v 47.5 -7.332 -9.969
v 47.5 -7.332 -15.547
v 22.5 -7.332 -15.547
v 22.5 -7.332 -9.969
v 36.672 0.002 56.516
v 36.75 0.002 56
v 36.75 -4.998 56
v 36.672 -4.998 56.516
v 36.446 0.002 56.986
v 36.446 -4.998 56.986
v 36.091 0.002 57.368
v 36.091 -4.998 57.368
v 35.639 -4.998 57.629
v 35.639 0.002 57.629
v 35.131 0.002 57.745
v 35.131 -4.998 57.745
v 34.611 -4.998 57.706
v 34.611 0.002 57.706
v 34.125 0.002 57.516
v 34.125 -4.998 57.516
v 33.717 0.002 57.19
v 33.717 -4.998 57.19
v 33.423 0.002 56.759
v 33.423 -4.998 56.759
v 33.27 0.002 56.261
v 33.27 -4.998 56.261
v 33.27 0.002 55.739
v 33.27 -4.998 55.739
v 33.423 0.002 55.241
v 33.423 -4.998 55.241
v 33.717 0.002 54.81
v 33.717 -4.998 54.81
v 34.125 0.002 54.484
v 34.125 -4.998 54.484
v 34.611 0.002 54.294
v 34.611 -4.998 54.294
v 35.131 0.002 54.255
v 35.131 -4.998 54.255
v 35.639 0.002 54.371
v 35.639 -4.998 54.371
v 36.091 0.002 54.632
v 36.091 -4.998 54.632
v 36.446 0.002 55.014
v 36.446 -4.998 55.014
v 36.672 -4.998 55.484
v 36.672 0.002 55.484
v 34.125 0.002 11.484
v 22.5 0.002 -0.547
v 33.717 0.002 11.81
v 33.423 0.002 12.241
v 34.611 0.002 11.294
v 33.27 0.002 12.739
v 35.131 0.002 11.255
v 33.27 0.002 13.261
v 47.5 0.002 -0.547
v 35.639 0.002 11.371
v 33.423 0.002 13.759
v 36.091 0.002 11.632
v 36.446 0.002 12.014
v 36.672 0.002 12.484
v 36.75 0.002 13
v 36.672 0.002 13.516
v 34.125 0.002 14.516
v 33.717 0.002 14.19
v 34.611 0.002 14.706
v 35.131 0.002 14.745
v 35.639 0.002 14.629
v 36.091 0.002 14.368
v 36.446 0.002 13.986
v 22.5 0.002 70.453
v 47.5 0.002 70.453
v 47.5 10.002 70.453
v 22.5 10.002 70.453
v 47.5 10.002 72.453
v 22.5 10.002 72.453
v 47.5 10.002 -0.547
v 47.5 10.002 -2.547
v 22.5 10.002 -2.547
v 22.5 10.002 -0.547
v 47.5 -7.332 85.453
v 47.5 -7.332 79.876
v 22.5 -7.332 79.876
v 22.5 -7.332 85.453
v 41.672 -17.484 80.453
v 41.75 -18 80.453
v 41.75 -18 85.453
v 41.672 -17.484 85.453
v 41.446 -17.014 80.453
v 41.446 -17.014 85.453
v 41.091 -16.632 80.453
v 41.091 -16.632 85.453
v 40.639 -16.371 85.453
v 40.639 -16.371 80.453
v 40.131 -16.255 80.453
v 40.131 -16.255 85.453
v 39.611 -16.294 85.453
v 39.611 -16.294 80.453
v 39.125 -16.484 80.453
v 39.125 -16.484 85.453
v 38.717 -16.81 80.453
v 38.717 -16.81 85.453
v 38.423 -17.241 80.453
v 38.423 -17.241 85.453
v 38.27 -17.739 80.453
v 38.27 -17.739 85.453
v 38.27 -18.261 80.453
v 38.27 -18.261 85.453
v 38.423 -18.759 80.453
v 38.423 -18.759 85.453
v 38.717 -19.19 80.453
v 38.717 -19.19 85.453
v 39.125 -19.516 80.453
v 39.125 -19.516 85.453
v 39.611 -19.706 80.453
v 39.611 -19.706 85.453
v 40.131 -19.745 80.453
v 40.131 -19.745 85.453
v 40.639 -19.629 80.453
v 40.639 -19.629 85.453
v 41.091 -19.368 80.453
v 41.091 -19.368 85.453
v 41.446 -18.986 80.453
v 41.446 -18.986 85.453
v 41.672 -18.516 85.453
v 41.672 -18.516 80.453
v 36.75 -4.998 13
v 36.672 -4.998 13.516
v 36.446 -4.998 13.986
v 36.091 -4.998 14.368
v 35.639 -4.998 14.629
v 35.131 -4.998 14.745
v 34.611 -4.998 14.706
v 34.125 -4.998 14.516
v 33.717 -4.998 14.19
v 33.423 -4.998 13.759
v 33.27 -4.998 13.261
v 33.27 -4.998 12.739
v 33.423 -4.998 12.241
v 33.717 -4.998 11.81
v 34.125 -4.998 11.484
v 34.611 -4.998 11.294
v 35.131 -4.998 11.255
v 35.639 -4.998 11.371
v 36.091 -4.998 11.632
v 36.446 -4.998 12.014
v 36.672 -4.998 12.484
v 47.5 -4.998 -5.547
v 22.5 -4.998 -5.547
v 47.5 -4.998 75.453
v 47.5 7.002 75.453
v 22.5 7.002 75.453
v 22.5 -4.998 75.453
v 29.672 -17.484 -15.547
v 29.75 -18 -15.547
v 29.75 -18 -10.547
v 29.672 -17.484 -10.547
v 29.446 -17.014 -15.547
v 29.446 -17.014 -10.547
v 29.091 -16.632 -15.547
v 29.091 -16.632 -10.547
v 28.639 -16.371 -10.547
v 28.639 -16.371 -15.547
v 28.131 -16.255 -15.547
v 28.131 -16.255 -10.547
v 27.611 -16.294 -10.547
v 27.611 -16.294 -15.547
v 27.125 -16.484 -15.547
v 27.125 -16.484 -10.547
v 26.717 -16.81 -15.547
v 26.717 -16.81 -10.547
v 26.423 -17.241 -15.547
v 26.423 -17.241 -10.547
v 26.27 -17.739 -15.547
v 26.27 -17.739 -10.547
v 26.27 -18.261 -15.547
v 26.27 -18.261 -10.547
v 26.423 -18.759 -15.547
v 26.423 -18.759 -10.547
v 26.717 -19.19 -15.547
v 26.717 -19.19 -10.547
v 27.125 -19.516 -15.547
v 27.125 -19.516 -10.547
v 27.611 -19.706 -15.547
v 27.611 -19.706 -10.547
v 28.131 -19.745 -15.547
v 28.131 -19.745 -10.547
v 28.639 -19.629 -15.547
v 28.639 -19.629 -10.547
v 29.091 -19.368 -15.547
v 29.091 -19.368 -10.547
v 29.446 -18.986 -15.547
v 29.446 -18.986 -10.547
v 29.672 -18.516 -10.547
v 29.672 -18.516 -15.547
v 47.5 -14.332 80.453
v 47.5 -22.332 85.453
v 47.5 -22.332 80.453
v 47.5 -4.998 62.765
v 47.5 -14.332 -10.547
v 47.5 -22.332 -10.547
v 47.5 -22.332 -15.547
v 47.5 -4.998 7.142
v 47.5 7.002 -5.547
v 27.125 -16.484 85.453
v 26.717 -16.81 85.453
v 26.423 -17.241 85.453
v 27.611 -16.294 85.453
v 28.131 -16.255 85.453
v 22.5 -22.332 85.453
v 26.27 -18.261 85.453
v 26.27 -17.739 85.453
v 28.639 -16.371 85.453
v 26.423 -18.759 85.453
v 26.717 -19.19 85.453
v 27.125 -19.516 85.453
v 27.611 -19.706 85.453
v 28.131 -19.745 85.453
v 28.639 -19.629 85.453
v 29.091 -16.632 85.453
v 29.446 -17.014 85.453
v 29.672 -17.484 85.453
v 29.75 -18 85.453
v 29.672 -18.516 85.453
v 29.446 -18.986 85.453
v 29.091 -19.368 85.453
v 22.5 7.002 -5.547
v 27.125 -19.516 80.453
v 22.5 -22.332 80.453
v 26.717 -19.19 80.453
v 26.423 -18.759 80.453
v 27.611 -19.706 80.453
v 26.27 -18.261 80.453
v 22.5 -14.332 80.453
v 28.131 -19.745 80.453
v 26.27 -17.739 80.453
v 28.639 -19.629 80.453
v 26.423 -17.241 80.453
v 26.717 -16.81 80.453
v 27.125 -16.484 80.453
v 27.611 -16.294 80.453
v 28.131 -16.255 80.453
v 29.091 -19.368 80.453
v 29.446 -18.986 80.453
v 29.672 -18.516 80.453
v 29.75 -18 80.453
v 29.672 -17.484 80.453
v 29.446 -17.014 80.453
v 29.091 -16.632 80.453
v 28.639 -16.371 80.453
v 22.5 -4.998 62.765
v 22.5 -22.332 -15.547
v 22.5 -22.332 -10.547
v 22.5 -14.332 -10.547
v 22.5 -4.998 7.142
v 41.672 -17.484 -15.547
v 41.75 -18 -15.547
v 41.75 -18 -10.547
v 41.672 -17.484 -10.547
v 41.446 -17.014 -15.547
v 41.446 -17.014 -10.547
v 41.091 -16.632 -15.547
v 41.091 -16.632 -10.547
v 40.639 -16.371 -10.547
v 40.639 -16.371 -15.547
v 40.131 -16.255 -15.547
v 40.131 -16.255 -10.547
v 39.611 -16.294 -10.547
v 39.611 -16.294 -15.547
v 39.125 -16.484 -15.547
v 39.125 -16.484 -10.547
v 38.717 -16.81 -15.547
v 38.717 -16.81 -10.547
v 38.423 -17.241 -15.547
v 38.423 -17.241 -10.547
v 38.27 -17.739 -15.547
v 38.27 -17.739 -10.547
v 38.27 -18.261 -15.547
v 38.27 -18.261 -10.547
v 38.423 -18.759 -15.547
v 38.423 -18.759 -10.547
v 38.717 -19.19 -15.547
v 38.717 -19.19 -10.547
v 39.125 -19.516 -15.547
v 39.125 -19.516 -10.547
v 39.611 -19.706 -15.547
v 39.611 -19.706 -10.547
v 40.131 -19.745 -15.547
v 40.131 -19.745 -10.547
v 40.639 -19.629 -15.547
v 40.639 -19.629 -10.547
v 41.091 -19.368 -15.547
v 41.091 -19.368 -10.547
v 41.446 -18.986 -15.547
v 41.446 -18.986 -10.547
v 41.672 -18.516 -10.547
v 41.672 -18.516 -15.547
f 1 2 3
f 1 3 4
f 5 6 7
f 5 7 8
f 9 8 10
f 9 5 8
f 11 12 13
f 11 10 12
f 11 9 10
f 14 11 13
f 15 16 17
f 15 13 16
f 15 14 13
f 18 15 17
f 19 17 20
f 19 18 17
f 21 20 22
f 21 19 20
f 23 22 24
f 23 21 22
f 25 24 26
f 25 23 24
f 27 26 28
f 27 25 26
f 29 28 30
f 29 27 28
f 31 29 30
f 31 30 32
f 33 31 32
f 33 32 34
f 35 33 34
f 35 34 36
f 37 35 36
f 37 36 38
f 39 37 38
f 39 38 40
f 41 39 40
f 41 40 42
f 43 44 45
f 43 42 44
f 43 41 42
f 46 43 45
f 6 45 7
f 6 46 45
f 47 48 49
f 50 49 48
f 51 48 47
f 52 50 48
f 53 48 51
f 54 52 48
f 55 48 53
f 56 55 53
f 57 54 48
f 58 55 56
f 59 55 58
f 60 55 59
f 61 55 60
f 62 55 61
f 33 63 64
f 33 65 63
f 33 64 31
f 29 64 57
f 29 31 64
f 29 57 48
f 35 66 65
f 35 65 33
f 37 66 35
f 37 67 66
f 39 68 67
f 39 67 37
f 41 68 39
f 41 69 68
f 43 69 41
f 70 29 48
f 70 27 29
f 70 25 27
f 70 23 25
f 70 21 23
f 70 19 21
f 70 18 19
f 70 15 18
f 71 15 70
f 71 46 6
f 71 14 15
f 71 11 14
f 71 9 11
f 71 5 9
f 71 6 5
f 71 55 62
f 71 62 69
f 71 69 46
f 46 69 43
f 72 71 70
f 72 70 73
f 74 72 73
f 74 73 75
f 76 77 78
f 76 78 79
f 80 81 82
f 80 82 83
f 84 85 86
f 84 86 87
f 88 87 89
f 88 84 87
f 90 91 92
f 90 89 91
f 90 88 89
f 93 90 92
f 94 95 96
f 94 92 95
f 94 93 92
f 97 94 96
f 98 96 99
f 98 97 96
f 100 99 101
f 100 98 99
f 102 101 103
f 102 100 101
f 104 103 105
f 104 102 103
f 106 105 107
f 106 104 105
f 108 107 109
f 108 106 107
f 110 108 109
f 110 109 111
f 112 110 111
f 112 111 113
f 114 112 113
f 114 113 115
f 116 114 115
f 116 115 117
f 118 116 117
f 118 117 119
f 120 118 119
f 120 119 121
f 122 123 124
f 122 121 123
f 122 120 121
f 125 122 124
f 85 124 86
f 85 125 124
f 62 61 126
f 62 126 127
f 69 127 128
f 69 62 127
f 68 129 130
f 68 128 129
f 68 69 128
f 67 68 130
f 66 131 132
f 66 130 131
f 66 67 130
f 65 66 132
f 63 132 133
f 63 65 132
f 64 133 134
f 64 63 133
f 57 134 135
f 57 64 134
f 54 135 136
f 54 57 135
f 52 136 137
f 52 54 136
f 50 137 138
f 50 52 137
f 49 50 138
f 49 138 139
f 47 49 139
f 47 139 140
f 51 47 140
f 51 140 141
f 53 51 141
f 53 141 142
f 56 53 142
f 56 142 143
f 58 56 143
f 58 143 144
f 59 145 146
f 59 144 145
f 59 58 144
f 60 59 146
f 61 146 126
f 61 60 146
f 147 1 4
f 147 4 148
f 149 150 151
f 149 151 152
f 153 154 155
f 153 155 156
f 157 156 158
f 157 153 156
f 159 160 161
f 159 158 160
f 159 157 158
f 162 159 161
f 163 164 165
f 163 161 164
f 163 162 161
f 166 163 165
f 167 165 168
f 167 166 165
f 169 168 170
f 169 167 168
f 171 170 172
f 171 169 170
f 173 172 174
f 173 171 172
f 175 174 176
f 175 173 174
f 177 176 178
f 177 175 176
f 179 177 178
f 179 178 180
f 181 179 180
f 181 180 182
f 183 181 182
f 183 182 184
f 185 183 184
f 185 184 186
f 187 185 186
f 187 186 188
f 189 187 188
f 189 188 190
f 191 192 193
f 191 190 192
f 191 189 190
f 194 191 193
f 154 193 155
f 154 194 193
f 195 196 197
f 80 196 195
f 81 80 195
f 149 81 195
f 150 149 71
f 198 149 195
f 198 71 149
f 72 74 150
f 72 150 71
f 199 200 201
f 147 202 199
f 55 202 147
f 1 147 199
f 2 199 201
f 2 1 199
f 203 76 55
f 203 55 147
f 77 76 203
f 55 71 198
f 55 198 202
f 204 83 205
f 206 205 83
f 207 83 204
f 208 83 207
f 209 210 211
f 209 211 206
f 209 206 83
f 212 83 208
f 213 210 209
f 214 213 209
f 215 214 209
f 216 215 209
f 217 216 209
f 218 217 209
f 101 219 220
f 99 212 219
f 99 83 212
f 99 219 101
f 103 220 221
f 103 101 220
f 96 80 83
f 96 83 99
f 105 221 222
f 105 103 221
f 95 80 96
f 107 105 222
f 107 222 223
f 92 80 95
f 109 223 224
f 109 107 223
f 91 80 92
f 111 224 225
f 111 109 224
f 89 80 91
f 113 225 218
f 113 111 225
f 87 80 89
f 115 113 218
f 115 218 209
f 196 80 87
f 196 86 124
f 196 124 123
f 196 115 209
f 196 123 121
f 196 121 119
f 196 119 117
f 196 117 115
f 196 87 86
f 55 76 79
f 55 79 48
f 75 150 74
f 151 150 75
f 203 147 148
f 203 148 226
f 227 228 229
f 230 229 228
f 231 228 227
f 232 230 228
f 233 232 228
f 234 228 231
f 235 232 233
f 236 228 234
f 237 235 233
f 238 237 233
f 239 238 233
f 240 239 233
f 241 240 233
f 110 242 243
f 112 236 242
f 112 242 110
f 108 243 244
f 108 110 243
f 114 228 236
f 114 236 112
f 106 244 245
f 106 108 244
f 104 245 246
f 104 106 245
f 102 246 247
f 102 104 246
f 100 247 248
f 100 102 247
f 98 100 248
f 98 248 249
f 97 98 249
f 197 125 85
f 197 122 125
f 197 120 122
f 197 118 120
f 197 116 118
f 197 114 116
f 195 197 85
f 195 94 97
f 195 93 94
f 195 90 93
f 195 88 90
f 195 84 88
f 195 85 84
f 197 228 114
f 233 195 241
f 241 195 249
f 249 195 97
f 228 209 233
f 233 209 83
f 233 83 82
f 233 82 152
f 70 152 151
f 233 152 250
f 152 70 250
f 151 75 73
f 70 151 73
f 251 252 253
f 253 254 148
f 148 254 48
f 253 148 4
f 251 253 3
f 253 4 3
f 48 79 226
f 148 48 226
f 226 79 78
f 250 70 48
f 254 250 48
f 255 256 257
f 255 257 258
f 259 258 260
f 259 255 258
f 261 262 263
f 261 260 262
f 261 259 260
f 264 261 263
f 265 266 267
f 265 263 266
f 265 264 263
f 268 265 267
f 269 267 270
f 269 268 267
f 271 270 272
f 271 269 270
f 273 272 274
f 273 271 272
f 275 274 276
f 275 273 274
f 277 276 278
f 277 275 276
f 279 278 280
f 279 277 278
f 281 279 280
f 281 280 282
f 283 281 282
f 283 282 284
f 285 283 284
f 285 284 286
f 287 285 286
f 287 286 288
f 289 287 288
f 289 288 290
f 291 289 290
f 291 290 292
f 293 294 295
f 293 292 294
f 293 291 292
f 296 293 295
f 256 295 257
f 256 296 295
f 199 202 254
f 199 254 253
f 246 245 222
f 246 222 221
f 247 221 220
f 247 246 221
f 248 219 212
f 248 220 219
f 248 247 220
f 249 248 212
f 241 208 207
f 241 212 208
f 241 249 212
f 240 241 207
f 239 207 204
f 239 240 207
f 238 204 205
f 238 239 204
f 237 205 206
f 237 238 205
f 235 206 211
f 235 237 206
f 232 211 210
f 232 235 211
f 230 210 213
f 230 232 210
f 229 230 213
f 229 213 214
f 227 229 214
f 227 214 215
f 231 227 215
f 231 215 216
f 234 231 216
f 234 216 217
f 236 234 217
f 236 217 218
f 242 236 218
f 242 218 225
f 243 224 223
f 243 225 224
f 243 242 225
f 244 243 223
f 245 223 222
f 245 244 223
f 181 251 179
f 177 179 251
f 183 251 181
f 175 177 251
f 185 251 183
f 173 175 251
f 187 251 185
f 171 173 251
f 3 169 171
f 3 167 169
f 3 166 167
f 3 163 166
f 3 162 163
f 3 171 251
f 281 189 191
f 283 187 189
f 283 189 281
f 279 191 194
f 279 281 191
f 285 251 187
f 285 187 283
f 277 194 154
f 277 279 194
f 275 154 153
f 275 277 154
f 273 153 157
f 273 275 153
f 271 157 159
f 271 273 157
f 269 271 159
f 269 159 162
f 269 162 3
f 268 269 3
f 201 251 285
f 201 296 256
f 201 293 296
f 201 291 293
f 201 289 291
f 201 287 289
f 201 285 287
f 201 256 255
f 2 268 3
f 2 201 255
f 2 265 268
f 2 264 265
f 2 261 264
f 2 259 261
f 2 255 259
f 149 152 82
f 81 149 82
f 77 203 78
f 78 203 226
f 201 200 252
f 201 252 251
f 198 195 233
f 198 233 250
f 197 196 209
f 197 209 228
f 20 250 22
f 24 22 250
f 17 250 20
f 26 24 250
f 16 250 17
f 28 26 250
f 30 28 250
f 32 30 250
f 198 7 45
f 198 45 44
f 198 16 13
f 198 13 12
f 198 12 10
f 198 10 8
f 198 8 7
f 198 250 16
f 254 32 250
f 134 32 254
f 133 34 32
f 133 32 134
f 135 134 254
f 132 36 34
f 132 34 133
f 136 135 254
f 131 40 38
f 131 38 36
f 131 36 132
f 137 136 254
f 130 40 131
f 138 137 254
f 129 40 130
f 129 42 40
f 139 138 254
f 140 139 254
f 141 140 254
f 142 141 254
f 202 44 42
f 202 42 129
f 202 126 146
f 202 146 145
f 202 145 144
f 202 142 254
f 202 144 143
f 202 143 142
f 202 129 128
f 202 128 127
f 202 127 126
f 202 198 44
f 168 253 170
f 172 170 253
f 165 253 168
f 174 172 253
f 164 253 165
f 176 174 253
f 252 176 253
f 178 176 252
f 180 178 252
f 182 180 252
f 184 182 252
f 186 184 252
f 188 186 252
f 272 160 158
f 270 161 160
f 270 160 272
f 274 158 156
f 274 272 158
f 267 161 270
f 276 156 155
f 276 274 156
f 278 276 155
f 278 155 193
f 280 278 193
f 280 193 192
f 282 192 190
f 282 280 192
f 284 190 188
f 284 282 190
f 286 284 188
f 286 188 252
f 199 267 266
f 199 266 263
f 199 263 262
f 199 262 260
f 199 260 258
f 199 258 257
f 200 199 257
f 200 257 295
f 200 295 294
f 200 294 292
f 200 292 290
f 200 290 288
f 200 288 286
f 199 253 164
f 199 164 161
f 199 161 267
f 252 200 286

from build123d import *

# Parameters (mm, degrees)
CYLINDER024_R          = 1.75
CYLINDER024_DEPTH      = 20
CYLINDER023_R          = 1.75
CYLINDER023_DEPTH      = 20
CYLINDER022_R          = 1.75
CYLINDER022_DEPTH      = 20
CYLINDER021_R          = 1.75
CYLINDER021_DEPTH      = 20
CYLINDER018_R          = 1.75
CYLINDER018_DEPTH      = 20
CYLINDER018_ROLL_ANGLE = 90
CYLINDER017_R          = 1.75
CYLINDER017_DEPTH      = 20
CYLINDER017_ROLL_ANGLE = 90
PAD006_DEPTH           = 25
CHAMFER006_SIZE        = 3


with BuildPart() as cylinder059:
    # Cylinder024 → Cylinder024 (new body)
    with BuildSketch(Plane(origin=(40, -18, -24), x_dir=(1, 0, 0), z_dir=(0, 0, 1))):
        Circle(CYLINDER024_R)
    extrude(amount=CYLINDER024_DEPTH)


with BuildPart() as cylinder058:
    # Cylinder023 → Cylinder023 (new body)
    with BuildSketch(Plane(origin=(28, -18, -24), x_dir=(1, 0, 0), z_dir=(0, 0, 1))):
        Circle(CYLINDER023_R)
    extrude(amount=CYLINDER023_DEPTH)


with BuildPart() as cylinder057:
    # Cylinder022 → Cylinder022 (new body)
    with BuildSketch(Plane(origin=(40, -18, 77), x_dir=(1, 0, 0), z_dir=(0, 0, 1))):
        Circle(CYLINDER022_R)
    extrude(amount=CYLINDER022_DEPTH)


with BuildPart() as cylinder056:
    # Cylinder021 → Cylinder021 (new body)
    with BuildSketch(Plane(origin=(28, -18, 77), x_dir=(1, 0, 0), z_dir=(0, 0, 1))):
        Circle(CYLINDER021_R)
    extrude(amount=CYLINDER021_DEPTH)


with BuildPart() as cylinder053:
    # Cylinder018 → Cylinder018 (new body)
    with BuildSketch(Plane.XY):
        Circle(CYLINDER018_R)
    extrude(amount=CYLINDER018_DEPTH)


with BuildPart() as cylinder053_1:
    # Cylinder018 roll: moved
    add(cylinder053.part.rotate(Axis((0, 0, 0), (1, 0, 0)), CYLINDER018_ROLL_ANGLE))


with BuildPart() as cylinder053_2:
    # Cylinder018 placement: moved
    add(cylinder053_1.part.moved(Location((35, 10, 13))))


with BuildPart() as cylinder052:
    # Cylinder017 → Cylinder017 (new body)
    with BuildSketch(Plane.XY):
        Circle(CYLINDER017_R)
    extrude(amount=CYLINDER017_DEPTH)


with BuildPart() as cylinder052_1:
    # Cylinder017 roll: moved
    add(cylinder052.part.rotate(Axis((0, 0, 0), (1, 0, 0)), CYLINDER017_ROLL_ANGLE))


with BuildPart() as cylinder052_2:
    # Cylinder017 placement: moved
    add(cylinder052_1.part.moved(Location((35, 10, 56))))


with BuildPart() as puente:
    # Sketch012 → Pad006 (new body)
    with BuildSketch(Plane(origin=(47.5, 0, -0.5), x_dir=(0, 0, 1), z_dir=(-1, 0, 0))):
        Polygon((-0.046577, 10.001707), (-0.046577, 0.001707), (70.953423, 0.001707), (70.953423, 10.001707), (75.953423, 10.001707), (75.953423, -4.998293), (80.375589, -7.331627), (85.953423, -7.331627), (85.953423, -22.331627), (80.953423, -22.331627), (80.953423, -14.331627), (63.264757, -4.998293), (7.642088, -4.998293), (-10.046577, -14.331627), (-10.046577, -22.331627), (-15.046577, -22.331627), (-15.046577, -7.331627), (-9.468744, -7.331627), (-5.046577, -4.998293), (-5.046577, 10.001707), align=None)
    extrude(amount=PAD006_DEPTH)

    # Cut037: cut Cylinder052
    add(cylinder052_2.part, mode=Mode.SUBTRACT)

    # Cut038: cut Cylinder053
    add(cylinder053_2.part, mode=Mode.SUBTRACT)

    # Cut045: cut Cylinder056
    add(cylinder056.part, mode=Mode.SUBTRACT)

    # Cut046: cut Cylinder057
    add(cylinder057.part, mode=Mode.SUBTRACT)

    # Cut047: cut Cylinder058
    add(cylinder058.part, mode=Mode.SUBTRACT)

    # Cut048: cut Cylinder059
    add(cylinder059.part, mode=Mode.SUBTRACT)

    # Chamfer006
    chamfer006_edges = [puente.edges().sort_by_distance(p)[0] for p in [
        (35, 10.001707, 75.453423),
        (35, 10.001707, -5.546577),
    ]]
    chamfer(chamfer006_edges, length=CHAMFER006_SIZE)


solid = puente.part
